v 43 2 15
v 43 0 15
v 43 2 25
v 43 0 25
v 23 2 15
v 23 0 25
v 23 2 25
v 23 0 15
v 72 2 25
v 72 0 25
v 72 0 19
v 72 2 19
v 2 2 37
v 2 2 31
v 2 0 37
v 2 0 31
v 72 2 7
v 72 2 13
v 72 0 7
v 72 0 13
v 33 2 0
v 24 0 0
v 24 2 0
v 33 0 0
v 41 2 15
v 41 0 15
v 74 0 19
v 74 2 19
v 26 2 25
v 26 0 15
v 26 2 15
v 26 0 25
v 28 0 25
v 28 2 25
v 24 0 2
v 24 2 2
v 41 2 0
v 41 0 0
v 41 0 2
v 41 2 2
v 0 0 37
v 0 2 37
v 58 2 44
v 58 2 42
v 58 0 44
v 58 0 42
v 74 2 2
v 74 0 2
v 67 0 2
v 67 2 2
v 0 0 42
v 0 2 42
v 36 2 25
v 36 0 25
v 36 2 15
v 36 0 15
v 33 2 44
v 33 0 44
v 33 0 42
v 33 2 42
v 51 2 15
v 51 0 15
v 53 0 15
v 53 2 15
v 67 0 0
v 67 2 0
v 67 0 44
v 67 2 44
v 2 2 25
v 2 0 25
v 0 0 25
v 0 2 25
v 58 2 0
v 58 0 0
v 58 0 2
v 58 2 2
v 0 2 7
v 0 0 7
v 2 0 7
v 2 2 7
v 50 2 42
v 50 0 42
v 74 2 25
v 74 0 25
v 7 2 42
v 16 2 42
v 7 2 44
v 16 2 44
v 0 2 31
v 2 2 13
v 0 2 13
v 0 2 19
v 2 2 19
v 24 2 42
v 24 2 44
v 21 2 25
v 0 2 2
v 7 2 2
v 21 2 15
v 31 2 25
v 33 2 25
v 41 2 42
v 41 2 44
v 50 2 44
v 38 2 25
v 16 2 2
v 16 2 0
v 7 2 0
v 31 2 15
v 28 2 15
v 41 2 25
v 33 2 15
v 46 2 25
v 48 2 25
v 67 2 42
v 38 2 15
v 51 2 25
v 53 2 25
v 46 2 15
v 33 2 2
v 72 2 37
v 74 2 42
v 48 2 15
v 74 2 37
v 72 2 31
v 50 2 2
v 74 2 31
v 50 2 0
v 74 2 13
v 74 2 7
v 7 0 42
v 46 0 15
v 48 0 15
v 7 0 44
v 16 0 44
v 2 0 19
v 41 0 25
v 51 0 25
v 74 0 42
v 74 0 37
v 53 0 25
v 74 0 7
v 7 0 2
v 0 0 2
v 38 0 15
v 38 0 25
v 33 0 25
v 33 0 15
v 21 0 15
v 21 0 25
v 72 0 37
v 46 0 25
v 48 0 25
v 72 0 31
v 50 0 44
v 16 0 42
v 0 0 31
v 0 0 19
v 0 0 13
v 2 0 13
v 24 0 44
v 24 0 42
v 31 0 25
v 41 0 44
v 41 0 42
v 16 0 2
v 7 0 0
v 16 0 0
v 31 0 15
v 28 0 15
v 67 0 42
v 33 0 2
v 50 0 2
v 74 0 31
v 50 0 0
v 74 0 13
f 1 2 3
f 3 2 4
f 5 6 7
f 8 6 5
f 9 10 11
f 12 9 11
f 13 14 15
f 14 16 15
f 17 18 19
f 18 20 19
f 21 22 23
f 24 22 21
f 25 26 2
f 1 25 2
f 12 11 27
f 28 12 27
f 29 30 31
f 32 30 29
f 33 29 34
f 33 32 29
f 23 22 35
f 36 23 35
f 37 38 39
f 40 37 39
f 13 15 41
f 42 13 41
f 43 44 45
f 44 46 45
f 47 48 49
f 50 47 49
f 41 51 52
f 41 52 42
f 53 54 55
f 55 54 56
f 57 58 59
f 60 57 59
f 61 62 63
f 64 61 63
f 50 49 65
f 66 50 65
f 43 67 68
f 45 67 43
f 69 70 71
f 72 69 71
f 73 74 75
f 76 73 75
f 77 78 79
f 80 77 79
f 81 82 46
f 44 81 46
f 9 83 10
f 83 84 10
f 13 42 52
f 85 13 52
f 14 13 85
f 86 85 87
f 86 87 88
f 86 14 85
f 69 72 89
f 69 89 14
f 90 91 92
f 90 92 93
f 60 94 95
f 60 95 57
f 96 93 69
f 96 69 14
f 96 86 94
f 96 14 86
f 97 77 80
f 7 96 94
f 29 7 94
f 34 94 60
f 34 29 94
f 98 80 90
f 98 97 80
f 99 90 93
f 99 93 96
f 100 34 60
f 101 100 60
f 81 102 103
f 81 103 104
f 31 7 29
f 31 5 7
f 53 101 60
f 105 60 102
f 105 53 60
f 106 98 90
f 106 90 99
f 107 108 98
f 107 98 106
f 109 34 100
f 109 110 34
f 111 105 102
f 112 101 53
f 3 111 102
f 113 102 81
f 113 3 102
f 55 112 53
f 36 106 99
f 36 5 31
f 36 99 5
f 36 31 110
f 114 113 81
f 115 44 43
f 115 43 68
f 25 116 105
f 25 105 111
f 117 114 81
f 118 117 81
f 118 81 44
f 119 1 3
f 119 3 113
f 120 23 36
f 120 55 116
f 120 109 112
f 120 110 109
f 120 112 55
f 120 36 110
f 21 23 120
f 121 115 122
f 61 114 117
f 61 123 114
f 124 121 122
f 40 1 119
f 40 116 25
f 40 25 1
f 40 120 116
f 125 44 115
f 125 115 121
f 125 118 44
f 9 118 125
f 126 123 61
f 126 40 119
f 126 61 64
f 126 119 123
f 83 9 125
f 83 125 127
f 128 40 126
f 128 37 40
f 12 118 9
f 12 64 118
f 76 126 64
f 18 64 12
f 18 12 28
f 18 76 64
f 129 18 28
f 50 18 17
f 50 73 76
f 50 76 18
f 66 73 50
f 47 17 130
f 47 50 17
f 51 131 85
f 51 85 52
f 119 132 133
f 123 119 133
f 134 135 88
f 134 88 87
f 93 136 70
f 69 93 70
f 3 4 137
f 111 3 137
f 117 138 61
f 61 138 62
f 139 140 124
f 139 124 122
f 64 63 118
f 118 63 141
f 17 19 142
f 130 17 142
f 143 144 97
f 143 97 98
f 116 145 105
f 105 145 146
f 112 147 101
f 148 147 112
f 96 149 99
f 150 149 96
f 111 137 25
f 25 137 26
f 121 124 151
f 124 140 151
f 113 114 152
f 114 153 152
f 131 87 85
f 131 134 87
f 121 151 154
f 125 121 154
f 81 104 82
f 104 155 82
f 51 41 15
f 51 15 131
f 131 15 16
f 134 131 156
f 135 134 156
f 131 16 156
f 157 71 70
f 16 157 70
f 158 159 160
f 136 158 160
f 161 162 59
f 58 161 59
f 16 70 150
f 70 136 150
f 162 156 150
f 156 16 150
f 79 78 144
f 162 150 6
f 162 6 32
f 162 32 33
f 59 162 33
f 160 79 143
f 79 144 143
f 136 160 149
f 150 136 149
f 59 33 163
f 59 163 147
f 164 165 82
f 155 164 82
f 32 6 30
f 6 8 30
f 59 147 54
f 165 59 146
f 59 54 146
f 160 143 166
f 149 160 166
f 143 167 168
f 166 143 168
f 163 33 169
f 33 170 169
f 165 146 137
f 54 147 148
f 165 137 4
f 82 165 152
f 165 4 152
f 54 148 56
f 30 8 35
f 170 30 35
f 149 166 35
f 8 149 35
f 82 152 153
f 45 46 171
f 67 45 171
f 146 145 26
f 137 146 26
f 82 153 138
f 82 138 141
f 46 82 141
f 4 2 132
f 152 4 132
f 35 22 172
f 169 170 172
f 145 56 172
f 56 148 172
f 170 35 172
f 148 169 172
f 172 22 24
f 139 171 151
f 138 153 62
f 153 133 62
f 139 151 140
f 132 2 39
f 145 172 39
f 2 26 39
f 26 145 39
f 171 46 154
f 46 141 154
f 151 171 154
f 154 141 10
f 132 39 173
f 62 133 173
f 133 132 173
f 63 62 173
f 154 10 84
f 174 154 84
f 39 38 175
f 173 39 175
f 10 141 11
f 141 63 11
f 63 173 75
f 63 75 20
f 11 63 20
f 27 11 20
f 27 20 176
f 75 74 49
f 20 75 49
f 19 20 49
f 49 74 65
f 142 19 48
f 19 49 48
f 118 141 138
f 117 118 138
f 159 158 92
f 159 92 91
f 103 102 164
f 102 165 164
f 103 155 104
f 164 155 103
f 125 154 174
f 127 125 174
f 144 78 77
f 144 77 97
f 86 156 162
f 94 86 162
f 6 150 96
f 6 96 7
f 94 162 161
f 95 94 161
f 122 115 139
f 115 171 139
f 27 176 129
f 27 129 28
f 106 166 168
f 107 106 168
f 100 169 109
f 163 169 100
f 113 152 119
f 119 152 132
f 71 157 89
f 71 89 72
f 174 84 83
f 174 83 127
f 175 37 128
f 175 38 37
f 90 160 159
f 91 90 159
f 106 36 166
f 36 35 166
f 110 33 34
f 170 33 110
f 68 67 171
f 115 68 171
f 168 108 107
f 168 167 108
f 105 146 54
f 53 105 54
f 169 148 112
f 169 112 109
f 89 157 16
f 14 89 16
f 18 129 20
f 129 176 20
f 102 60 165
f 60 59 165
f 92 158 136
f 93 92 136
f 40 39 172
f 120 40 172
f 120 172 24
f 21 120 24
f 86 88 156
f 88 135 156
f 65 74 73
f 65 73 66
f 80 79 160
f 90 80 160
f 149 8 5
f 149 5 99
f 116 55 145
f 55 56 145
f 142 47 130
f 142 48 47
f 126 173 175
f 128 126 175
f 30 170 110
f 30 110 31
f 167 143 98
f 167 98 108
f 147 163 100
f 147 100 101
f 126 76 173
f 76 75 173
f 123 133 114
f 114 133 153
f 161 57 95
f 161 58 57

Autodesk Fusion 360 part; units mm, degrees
sketch "スケッチ1" plane through (0, 0, 0) normal (0, 1, 0) x (1, 0, 0)
  line L0 (0, 0) -> (74, 0)
  line L1 (74, 0) -> (74, -44)
  line L2 (74, -44) -> (0, -44)
  line L3 (0, -44) -> (0, 0)
  dimension "d1" = 74
  dimension "d2" = 44
extrude "押し出し1" add sketch "スケッチ1" along normal blind 2
sketch "スケッチ2" plane through (0, 0, 0) normal (0, -1, 0) x (1, 0, 0)
  line L0 (74, 44) -> (0, 44)
  line L1 (0, 44) -> (0, 0)
  line L2 (0, 0) -> (74, 0)
  line L3 (74, 0) -> (74, 44)
  line L4 (0, 44) -> (7, 44)
  line L5 (7, 44) -> (7, 42)
  line L6 (7, 42) -> (0, 42)
  line L7 (0, 42) -> (0, 44)
  line L8 (16, 42) -> (24, 42)
  line L9 (24, 42) -> (24, 44)
  line L10 (24, 44) -> (16, 44)
  line L11 (16, 44) -> (16, 42)
  line L12 (41, 44) -> (33, 44)
  line L13 (33, 42) -> (41, 42)
  line L14 (41, 42) -> (41, 44)
  line L15 (33, 44) -> (33, 42)
  line L16 (58, 44) -> (50, 44)
  line L17 (50, 42) -> (58, 42)
  line L18 (58, 42) -> (58, 44)
  line L19 (50, 44) -> (50, 42)
  line L20 (67, 42) -> (74, 42)
  line L21 (74, 42) -> (74, 44)
  line L22 (74, 44) -> (67, 44)
  line L23 (67, 44) -> (67, 42)
  line L24 (50, 2) -> (50, 0)
  line L25 (67, 2) -> (67, 0)
  line L26 (16, 0) -> (24, 0)
  line L27 (50, 0) -> (58, 0)
  line L28 (0, 2) -> (7, 2)
  line L29 (67, 0) -> (74, 0)
  line L30 (58, 0) -> (58, 2)
  line L31 (24, 2) -> (16, 2)
  line L32 (33, 2) -> (33, 0)
  line L33 (58, 2) -> (50, 2)
  line L34 (33, 0) -> (41, 0)
  line L35 (0, 0) -> (0, 2)
  line L36 (24, 0) -> (24, 2)
  line L37 (74, 2) -> (67, 2)
  line L38 (7, 2) -> (7, 0)
  line L39 (41, 0) -> (41, 2)
  line L40 (16, 2) -> (16, 0)
  line L41 (74, 0) -> (74, 2)
  line L42 (7, 0) -> (0, 0)
  line L43 (41, 2) -> (33, 2)
  dimension "d5" = 7
  dimension "d6" = 2
  dimension "d7" = 2
  dimension "d8" = 8
  dimension "d9" = 9
  dimension "d12" = 17
  dimension "d13" = 0
  dimension "d14" = 7
  dimension "d15" = 2
  dimension "d16" = 9
extrude "押し出し2" cut sketch "スケッチ2" against normal blind 2 contours L0 L3 L20 L21 L22 L23 | L0 L16 L17 L18 L19 | L2 L3 L25 L29 L37 L41 | L0 L12 L13 L14 L15 | L2 L24 L27 L30 L33 | L0 L8 L9 L10 L11 | L2 L32 L34 L39 L43 | L0 L1 L4 L5 L6 L7 | L2 L26 L31 L36 L40 | L1 L2 L28 L35 L38 L42
sketch "スケッチ3" plane through (0, 0, 0) normal (0, -1, 0) x (1, 0, 0)
  line L0 (33, 42) -> (33, 44)
  line L1 (33, 44) -> (24, 44)
  line L2 (24, 44) -> (24, 42)
  line L3 (24, 42) -> (16, 42)
  line L4 (16, 42) -> (16, 44)
  line L5 (16, 44) -> (7, 44)
  line L6 (7, 44) -> (7, 42)
  line L7 (7, 42) -> (0, 42)
  line L8 (0, 42) -> (0, 2)
  line L9 (0, 2) -> (7, 2)
  line L10 (7, 2) -> (7, 0)
  line L11 (7, 0) -> (16, 0)
  line L12 (16, 0) -> (16, 2)
  line L13 (16, 2) -> (24, 2)
  line L14 (24, 2) -> (24, 0)
  line L15 (24, 0) -> (33, 0)
  line L16 (33, 0) -> (33, 2)
  line L17 (33, 2) -> (41, 2)
  line L18 (41, 2) -> (41, 0)
  line L19 (41, 0) -> (50, 0)
  line L20 (50, 0) -> (50, 2)
  line L21 (50, 2) -> (58, 2)
  line L22 (58, 2) -> (58, 0)
  line L23 (58, 0) -> (67, 0)
  line L24 (67, 0) -> (67, 2)
  line L25 (67, 2) -> (74, 2)
  line L26 (74, 2) -> (74, 42)
  line L27 (74, 42) -> (67, 42)
  line L28 (67, 42) -> (67, 44)
  line L29 (67, 44) -> (58, 44)
  line L30 (58, 44) -> (58, 42)
  line L31 (58, 42) -> (50, 42)
  line L32 (50, 42) -> (50, 44)
  line L33 (50, 44) -> (41, 44)
  line L34 (41, 44) -> (41, 42)
  line L35 (41, 42) -> (33, 42)
  line L36 (2, 37) -> (0, 37)
  line L37 (0, 37) -> (0, 31)
  line L38 (0, 31) -> (2, 31)
  line L39 (2, 31) -> (2, 37)
  line L40 (0, 19) -> (2, 19)
  line L41 (0, 25) -> (0, 19)
  line L42 (2, 25) -> (0, 25)
  line L43 (2, 19) -> (2, 25)
  line L44 (0, 7) -> (2, 7)
  line L45 (0, 13) -> (0, 7)
  line L46 (2, 13) -> (0, 13)
  line L47 (2, 7) -> (2, 13)
  line L48 (72, 31) -> (74, 31)
  line L49 (74, 37) -> (72, 37)
  line L50 (74, 25) -> (72, 25)
  line L51 (72, 37) -> (72, 31)
  line L52 (72, 19) -> (74, 19)
  line L53 (72, 7) -> (74, 7)
  line L54 (74, 19) -> (74, 25)
  line L55 (72, 25) -> (72, 19)
  line L56 (74, 7) -> (74, 13)
  line L57 (74, 31) -> (74, 37)
  line L58 (72, 13) -> (72, 7)
  line L59 (74, 13) -> (72, 13)
  dimension "d23" = 7
  dimension "d24" = 6
  dimension "d25" = 2
  dimension "d28" = 0
  dimension "d29" = -12
  dimension "d30" = 7
  dimension "d33" = 72
  dimension "d34" = 0
extrude "押し出し3" cut sketch "スケッチ3" against normal blind 2 contours L8 L36 L37 L38 L39 | L26 L48 L49 L51 L57 | L8 L40 L41 L42 L43 | L26 L50 L52 L54 L55 | L8 L44 L45 L46 L47 | L26 L53 L56 L58 L59
sketch "スケッチ4" plane through (0, 0, 0) normal (0, -1, 0) x (1, 0, 0)
  line L0 (2, 31) -> (0, 31)
  line L1 (0, 31) -> (0, 25)
  line L2 (0, 25) -> (2, 25)
  line L3 (2, 25) -> (2, 19)
  line L4 (2, 19) -> (0, 19)
  line L5 (0, 19) -> (0, 13)
  line L6 (0, 13) -> (2, 13)
  line L7 (2, 13) -> (2, 7)
  line L8 (2, 7) -> (0, 7)
  line L9 (0, 7) -> (0, 2)
  line L10 (0, 2) -> (7, 2)
  line L11 (7, 2) -> (7, 0)
  line L12 (7, 0) -> (16, 0)
  line L13 (16, 0) -> (16, 2)
  line L14 (16, 2) -> (24, 2)
  line L15 (24, 2) -> (24, 0)
  line L16 (24, 0) -> (33, 0)
  line L17 (33, 0) -> (33, 2)
  line L18 (33, 2) -> (41, 2)
  line L19 (41, 2) -> (41, 0)
  line L20 (41, 0) -> (50, 0)
  line L21 (50, 0) -> (50, 2)
  line L22 (50, 2) -> (58, 2)
  line L23 (58, 2) -> (58, 0)
  line L24 (58, 0) -> (67, 0)
  line L25 (67, 0) -> (67, 2)
  line L26 (67, 2) -> (74, 2)
  line L27 (74, 2) -> (74, 7)
  line L28 (74, 7) -> (72, 7)
  line L29 (72, 7) -> (72, 13)
  line L30 (72, 13) -> (74, 13)
  line L31 (74, 13) -> (74, 19)
  line L32 (74, 19) -> (72, 19)
  line L33 (72, 19) -> (72, 25)
  line L34 (72, 25) -> (74, 25)
  line L35 (74, 25) -> (74, 31)
  line L36 (74, 31) -> (72, 31)
  line L37 (72, 31) -> (72, 37)
  line L38 (72, 37) -> (74, 37)
  line L39 (74, 37) -> (74, 42)
  line L40 (74, 42) -> (67, 42)
  line L41 (67, 42) -> (67, 44)
  line L42 (67, 44) -> (58, 44)
  line L43 (58, 44) -> (58, 42)
  line L44 (58, 42) -> (50, 42)
  line L45 (50, 42) -> (50, 44)
  line L46 (50, 44) -> (41, 44)
  line L47 (41, 44) -> (41, 42)
  line L48 (41, 42) -> (33, 42)
  line L49 (33, 42) -> (33, 44)
  line L50 (33, 44) -> (24, 44)
  line L51 (24, 44) -> (24, 42)
  line L52 (24, 42) -> (16, 42)
  line L53 (16, 42) -> (16, 44)
  line L54 (16, 44) -> (7, 44)
  line L55 (7, 44) -> (7, 42)
  line L56 (7, 42) -> (0, 42)
  line L57 (0, 42) -> (0, 37)
  line L58 (0, 37) -> (2, 37)
  line L59 (2, 37) -> (2, 31)
  line L60 (36, 15) -> (38, 15)
  line L61 (38, 15) -> (38, 25)
  line L62 (38, 25) -> (36, 25)
  line L63 (36, 25) -> (36, 15)
  line L64 (33, 15) -> (31, 15)
  line L65 (31, 15) -> (31, 25)
  line L66 (31, 25) -> (33, 25)
  line L67 (33, 25) -> (33, 15)
  line L68 (28, 15) -> (26, 15)
  line L69 (26, 15) -> (26, 25)
  line L70 (26, 25) -> (28, 25)
  line L71 (28, 25) -> (28, 15)
  line L72 (41, 15) -> (43, 15)
  line L73 (43, 15) -> (43, 25)
  line L74 (43, 25) -> (41, 25)
  line L75 (41, 25) -> (41, 15)
  line L76 (46, 15) -> (48, 15)
  line L77 (48, 15) -> (48, 25)
  line L78 (48, 25) -> (46, 25)
  line L79 (46, 25) -> (46, 15)
  line L80 (23, 15) -> (21, 15)
  line L81 (21, 15) -> (21, 25)
  line L82 (21, 25) -> (23, 25)
  line L83 (23, 25) -> (23, 15)
  line L84 (51, 15) -> (53, 15)
  line L85 (53, 15) -> (53, 25)
  line L86 (53, 25) -> (51, 25)
  line L87 (51, 25) -> (51, 15)
extrude "押し出し4" cut sketch "スケッチ4" against normal blind 2 contours L60 L61 L62 L63 | L64 L65 L66 L67 | L68 L69 L70 L71 | L72 L73 L74 L75 | L76 L77 L78 L79 | L80 L81 L82 L83 | L84 L85 L86 L87
sketch "スケッチ5" plane through (0, 0, 0) normal (0, -1, 0) x (1, 0, 0)
  line L0 (31, 15) -> (31, 25)
  line L1 (31, 25) -> (33, 25)
  line L2 (33, 25) -> (33, 15)
  line L3 (33, 15) -> (31, 15)
  line L4 (38, 15) -> (36, 15)
  line L5 (36, 15) -> (36, 25)
  line L6 (36, 25) -> (38, 25)
  line L7 (38, 25) -> (38, 15)
  line L8 (26, 15) -> (26, 25)
  line L9 (26, 25) -> (28, 25)
  line L10 (28, 25) -> (28, 15)
  line L11 (28, 15) -> (26, 15)
  line L12 (21, 15) -> (21, 25)
  line L13 (21, 25) -> (23, 25)
  line L14 (23, 25) -> (23, 15)
  line L15 (23, 15) -> (21, 15)
  line L16 (48, 15) -> (46, 15)
  line L17 (46, 15) -> (46, 25)
  line L18 (46, 25) -> (48, 25)
  line L19 (48, 25) -> (48, 15)
  line L20 (43, 15) -> (41, 15)
  line L21 (41, 15) -> (41, 25)
  line L22 (41, 25) -> (43, 25)
  line L23 (43, 25) -> (43, 15)
  line L24 (53, 15) -> (51, 15)
  line L25 (51, 15) -> (51, 25)
  line L26 (51, 25) -> (53, 25)
  line L27 (53, 25) -> (53, 15)
  line L28 (2, 31) -> (0, 31)
  line L29 (0, 31) -> (0, 25)
  line L30 (0, 25) -> (2, 25)
  line L31 (2, 25) -> (2, 19)
  line L32 (2, 19) -> (0, 19)
  line L33 (0, 19) -> (0, 13)
  line L34 (0, 13) -> (2, 13)
  line L35 (2, 13) -> (2, 7)
  line L36 (2, 7) -> (0, 7)
  line L37 (0, 7) -> (0, 2)
  line L38 (0, 2) -> (7, 2)
  line L39 (7, 2) -> (7, 0)
  line L40 (7, 0) -> (16, 0)
  line L41 (16, 0) -> (16, 2)
  line L42 (16, 2) -> (24, 2)
  line L43 (24, 2) -> (24, 0)
  line L44 (24, 0) -> (33, 0)
  line L45 (33, 0) -> (33, 2)
  line L46 (33, 2) -> (41, 2)
  line L47 (41, 2) -> (41, 0)
  line L48 (41, 0) -> (50, 0)
  line L49 (50, 0) -> (50, 2)
  line L50 (50, 2) -> (58, 2)
  line L51 (58, 2) -> (58, 0)
  line L52 (58, 0) -> (67, 0)
  line L53 (67, 0) -> (67, 2)
  line L54 (67, 2) -> (74, 2)
  line L55 (74, 2) -> (74, 7)
  line L56 (74, 7) -> (72, 7)
  line L57 (72, 7) -> (72, 13)
  line L58 (72, 13) -> (74, 13)
  line L59 (74, 13) -> (74, 19)
  line L60 (74, 19) -> (72, 19)
  line L61 (72, 19) -> (72, 25)
  line L62 (72, 25) -> (74, 25)
  line L63 (74, 25) -> (74, 31)
  line L64 (74, 31) -> (72, 31)
  line L65 (72, 31) -> (72, 37)
  line L66 (72, 37) -> (74, 37)
  line L67 (74, 37) -> (74, 42)
  line L68 (74, 42) -> (67, 42)
  line L69 (67, 42) -> (67, 44)
  line L70 (67, 44) -> (58, 44)
  line L71 (58, 44) -> (58, 42)
  line L72 (58, 42) -> (50, 42)
  line L73 (50, 42) -> (50, 44)
  line L74 (50, 44) -> (41, 44)
  line L75 (41, 44) -> (41, 42)
  line L76 (41, 42) -> (33, 42)
  line L77 (33, 42) -> (33, 44)
  line L78 (33, 44) -> (24, 44)
  line L79 (24, 44) -> (24, 42)
  line L80 (24, 42) -> (16, 42)
  line L81 (16, 42) -> (16, 44)
  line L82 (16, 44) -> (7, 44)
  line L83 (7, 44) -> (7, 42)
  line L84 (7, 42) -> (0, 42)
  line L85 (0, 42) -> (0, 37)
  line L86 (0, 37) -> (2, 37)
  line L87 (2, 37) -> (2, 31)
